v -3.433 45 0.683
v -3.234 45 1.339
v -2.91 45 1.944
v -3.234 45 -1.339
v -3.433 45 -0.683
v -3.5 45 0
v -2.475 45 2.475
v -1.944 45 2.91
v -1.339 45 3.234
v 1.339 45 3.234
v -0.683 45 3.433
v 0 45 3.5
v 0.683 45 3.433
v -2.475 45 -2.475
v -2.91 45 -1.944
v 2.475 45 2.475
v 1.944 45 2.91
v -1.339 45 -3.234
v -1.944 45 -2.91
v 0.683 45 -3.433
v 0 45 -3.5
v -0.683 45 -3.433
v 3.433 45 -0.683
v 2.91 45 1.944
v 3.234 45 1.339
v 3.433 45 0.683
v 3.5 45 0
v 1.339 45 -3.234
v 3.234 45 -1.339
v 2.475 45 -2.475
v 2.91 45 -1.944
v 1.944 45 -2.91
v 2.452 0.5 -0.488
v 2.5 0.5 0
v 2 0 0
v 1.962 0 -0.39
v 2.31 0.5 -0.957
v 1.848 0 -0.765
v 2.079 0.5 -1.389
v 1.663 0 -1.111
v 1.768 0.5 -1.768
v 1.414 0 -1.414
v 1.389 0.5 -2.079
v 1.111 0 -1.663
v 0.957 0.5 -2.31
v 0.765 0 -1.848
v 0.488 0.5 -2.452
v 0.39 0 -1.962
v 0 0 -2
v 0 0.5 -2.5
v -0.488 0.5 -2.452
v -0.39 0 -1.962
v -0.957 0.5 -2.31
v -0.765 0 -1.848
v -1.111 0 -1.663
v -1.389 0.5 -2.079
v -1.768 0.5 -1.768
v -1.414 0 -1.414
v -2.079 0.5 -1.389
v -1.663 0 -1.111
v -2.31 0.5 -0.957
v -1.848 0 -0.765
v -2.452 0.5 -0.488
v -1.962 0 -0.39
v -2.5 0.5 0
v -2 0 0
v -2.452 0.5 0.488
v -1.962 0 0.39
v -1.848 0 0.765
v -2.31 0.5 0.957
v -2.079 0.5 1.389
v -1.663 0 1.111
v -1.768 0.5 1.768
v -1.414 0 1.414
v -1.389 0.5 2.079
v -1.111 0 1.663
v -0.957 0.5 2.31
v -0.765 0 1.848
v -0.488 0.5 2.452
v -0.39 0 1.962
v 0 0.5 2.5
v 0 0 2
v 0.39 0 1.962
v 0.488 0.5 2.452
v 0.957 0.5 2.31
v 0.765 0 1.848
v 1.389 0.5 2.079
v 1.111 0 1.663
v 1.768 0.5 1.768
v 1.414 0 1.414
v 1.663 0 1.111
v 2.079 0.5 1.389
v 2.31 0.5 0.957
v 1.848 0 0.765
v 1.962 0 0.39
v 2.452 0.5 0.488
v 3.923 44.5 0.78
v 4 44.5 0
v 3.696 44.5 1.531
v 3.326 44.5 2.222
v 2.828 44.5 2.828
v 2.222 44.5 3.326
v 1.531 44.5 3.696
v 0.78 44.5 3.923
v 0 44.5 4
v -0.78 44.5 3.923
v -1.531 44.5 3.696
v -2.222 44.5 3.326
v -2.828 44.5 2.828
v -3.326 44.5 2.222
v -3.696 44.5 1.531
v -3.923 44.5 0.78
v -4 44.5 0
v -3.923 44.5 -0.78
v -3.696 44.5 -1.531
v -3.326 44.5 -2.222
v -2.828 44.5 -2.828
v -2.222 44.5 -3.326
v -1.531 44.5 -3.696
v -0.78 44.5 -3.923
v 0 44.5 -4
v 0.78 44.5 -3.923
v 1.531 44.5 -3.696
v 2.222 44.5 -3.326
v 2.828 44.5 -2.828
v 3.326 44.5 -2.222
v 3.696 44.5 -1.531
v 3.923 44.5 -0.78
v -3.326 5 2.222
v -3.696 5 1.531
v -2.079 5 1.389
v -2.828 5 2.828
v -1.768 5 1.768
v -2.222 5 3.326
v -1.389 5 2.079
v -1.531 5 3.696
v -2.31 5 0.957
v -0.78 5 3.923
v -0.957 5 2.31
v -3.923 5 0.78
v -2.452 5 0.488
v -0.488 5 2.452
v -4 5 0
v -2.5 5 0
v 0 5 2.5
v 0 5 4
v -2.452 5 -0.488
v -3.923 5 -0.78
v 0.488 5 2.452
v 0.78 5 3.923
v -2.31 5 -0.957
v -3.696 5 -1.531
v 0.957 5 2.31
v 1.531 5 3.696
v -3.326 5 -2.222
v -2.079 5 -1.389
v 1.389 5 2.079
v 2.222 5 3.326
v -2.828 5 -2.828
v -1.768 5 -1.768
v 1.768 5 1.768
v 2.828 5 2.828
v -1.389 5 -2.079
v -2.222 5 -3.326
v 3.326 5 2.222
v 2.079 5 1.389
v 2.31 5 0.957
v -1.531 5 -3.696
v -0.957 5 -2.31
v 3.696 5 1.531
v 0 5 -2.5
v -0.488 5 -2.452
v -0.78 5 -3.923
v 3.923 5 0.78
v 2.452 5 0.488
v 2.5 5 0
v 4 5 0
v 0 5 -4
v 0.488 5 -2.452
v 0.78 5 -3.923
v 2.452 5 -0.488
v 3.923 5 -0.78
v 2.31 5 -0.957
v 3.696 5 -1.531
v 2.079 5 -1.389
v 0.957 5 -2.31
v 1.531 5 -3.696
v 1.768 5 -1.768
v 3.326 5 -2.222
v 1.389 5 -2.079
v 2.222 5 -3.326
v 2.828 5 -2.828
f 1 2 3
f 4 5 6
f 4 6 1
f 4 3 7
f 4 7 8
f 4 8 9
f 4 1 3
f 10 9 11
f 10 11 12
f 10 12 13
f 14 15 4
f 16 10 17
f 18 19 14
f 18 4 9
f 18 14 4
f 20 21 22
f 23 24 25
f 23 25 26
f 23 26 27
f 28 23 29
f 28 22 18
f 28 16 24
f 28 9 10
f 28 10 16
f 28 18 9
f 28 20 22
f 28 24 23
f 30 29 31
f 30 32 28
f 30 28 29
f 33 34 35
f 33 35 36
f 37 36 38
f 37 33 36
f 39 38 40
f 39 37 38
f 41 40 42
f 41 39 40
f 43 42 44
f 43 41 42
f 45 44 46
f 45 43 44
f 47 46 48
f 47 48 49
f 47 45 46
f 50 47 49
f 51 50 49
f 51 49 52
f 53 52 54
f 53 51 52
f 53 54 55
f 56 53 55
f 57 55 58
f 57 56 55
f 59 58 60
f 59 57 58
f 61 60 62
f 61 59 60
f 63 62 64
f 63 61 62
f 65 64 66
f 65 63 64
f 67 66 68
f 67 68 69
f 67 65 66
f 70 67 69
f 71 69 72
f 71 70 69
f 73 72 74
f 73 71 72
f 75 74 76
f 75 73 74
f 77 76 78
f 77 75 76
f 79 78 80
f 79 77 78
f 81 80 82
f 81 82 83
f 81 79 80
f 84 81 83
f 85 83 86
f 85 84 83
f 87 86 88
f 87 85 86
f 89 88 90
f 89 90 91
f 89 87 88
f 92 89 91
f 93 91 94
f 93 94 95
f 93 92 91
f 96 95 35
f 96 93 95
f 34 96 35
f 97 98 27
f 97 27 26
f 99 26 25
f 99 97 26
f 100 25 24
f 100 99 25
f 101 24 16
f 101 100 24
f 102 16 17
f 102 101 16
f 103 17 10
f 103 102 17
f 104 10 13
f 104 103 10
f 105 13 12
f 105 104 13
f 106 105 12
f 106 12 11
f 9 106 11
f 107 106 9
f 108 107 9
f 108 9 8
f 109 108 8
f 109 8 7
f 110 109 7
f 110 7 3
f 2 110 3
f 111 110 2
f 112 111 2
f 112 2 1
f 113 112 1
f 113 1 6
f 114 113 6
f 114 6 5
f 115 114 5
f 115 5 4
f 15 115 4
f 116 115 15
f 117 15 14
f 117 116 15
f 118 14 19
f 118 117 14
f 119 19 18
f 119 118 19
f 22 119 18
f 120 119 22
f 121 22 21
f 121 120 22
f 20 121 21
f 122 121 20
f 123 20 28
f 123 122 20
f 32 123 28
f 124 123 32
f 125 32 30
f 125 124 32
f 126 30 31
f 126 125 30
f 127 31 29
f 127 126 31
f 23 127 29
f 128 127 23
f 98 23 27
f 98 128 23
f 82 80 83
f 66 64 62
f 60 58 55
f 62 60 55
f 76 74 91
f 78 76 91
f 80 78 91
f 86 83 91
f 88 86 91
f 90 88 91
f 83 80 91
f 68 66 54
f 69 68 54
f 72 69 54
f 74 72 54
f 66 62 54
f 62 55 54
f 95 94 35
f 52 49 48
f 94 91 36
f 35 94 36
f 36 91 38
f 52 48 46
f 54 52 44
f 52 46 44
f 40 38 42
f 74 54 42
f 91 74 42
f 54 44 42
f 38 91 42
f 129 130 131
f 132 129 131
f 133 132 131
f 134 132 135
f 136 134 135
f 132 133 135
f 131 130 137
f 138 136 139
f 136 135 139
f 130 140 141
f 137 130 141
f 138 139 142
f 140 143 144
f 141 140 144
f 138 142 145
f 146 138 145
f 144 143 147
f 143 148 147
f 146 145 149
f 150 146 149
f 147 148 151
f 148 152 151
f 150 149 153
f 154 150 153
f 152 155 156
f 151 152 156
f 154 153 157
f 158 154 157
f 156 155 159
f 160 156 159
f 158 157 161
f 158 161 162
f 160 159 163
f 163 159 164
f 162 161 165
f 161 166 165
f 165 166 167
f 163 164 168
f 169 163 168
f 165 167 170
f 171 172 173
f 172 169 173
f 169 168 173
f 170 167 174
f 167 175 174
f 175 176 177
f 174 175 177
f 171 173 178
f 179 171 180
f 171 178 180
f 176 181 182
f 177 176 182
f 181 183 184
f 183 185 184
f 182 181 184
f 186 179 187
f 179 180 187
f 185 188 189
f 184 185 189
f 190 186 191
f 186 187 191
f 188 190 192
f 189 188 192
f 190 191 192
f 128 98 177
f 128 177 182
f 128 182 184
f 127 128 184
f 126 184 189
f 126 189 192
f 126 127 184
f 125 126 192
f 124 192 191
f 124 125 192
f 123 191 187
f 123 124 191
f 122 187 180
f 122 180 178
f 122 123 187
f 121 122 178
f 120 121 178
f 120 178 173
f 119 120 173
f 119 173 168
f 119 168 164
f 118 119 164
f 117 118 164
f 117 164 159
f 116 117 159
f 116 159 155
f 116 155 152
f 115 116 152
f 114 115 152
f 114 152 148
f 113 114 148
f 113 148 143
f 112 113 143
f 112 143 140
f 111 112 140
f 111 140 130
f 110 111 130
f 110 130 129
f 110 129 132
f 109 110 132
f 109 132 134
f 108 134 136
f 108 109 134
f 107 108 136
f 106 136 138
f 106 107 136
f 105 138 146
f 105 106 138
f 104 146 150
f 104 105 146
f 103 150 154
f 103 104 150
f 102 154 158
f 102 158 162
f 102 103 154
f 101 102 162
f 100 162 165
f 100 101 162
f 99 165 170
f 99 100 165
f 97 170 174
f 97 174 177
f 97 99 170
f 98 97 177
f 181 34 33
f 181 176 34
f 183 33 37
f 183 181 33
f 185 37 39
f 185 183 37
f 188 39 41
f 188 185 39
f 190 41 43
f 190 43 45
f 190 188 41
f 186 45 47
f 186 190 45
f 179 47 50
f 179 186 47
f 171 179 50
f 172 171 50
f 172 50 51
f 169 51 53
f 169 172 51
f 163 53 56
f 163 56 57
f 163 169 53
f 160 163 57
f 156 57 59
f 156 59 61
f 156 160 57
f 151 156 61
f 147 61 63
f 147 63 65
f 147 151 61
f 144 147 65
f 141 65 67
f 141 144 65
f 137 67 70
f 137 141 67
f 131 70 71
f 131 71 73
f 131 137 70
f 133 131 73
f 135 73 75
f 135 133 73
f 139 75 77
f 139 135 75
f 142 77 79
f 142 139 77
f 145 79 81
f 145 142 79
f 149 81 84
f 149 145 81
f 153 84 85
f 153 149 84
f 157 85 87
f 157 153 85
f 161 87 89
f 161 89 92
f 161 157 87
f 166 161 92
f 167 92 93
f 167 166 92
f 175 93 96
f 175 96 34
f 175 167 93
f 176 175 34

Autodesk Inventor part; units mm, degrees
ref_plane "YZ Plane" through (0, 0, 0) normal (1, 0, 0) x (0, 1, 0)
ref_plane "XZ Plane" through (0, 0, 0) normal (0, 1, 0) x (-1, 0, 0)
ref_plane "XY Plane" through (0, 0, 0) normal (0, 0, 1) x (1, 0, 0)
sketch "Sketch2" plane through (0, 0, 0) normal (0, 0, 1) x (1, 0, 0)
  line L0 (2.5, 0) -> (2.5, 5)
  line L1 (2.5, 5) -> (4, 5)
  line L2 (4, 5) -> (4, 45)
  line L3 (0, 0) -> (0, 45)
  line L4 (0, 0) -> (2.5, 0)
  line L5 (4, 45) -> (0, 45)
  point P0 (0, 25)
  dimension "d2" = 5
  dimension "d3" = 40
  dimension "d4" = 8
  dimension "d5" = 5
revolve "Revolution1" add sketch "Sketch2" angle 360 about axis through (0, 0, 0) along (0, 1, 0)
thread "Thread1" size "M5x0.8" class "6g" standard "ANSI Metric M Profile" full length
chamfer "Chamfer1" distance 0.5 angle 45 2 edges at (-4, 45, 0) (-2.5, 0, 0)
properties part number "OringM5Wrench" material "Stainless Steel, 440C"
